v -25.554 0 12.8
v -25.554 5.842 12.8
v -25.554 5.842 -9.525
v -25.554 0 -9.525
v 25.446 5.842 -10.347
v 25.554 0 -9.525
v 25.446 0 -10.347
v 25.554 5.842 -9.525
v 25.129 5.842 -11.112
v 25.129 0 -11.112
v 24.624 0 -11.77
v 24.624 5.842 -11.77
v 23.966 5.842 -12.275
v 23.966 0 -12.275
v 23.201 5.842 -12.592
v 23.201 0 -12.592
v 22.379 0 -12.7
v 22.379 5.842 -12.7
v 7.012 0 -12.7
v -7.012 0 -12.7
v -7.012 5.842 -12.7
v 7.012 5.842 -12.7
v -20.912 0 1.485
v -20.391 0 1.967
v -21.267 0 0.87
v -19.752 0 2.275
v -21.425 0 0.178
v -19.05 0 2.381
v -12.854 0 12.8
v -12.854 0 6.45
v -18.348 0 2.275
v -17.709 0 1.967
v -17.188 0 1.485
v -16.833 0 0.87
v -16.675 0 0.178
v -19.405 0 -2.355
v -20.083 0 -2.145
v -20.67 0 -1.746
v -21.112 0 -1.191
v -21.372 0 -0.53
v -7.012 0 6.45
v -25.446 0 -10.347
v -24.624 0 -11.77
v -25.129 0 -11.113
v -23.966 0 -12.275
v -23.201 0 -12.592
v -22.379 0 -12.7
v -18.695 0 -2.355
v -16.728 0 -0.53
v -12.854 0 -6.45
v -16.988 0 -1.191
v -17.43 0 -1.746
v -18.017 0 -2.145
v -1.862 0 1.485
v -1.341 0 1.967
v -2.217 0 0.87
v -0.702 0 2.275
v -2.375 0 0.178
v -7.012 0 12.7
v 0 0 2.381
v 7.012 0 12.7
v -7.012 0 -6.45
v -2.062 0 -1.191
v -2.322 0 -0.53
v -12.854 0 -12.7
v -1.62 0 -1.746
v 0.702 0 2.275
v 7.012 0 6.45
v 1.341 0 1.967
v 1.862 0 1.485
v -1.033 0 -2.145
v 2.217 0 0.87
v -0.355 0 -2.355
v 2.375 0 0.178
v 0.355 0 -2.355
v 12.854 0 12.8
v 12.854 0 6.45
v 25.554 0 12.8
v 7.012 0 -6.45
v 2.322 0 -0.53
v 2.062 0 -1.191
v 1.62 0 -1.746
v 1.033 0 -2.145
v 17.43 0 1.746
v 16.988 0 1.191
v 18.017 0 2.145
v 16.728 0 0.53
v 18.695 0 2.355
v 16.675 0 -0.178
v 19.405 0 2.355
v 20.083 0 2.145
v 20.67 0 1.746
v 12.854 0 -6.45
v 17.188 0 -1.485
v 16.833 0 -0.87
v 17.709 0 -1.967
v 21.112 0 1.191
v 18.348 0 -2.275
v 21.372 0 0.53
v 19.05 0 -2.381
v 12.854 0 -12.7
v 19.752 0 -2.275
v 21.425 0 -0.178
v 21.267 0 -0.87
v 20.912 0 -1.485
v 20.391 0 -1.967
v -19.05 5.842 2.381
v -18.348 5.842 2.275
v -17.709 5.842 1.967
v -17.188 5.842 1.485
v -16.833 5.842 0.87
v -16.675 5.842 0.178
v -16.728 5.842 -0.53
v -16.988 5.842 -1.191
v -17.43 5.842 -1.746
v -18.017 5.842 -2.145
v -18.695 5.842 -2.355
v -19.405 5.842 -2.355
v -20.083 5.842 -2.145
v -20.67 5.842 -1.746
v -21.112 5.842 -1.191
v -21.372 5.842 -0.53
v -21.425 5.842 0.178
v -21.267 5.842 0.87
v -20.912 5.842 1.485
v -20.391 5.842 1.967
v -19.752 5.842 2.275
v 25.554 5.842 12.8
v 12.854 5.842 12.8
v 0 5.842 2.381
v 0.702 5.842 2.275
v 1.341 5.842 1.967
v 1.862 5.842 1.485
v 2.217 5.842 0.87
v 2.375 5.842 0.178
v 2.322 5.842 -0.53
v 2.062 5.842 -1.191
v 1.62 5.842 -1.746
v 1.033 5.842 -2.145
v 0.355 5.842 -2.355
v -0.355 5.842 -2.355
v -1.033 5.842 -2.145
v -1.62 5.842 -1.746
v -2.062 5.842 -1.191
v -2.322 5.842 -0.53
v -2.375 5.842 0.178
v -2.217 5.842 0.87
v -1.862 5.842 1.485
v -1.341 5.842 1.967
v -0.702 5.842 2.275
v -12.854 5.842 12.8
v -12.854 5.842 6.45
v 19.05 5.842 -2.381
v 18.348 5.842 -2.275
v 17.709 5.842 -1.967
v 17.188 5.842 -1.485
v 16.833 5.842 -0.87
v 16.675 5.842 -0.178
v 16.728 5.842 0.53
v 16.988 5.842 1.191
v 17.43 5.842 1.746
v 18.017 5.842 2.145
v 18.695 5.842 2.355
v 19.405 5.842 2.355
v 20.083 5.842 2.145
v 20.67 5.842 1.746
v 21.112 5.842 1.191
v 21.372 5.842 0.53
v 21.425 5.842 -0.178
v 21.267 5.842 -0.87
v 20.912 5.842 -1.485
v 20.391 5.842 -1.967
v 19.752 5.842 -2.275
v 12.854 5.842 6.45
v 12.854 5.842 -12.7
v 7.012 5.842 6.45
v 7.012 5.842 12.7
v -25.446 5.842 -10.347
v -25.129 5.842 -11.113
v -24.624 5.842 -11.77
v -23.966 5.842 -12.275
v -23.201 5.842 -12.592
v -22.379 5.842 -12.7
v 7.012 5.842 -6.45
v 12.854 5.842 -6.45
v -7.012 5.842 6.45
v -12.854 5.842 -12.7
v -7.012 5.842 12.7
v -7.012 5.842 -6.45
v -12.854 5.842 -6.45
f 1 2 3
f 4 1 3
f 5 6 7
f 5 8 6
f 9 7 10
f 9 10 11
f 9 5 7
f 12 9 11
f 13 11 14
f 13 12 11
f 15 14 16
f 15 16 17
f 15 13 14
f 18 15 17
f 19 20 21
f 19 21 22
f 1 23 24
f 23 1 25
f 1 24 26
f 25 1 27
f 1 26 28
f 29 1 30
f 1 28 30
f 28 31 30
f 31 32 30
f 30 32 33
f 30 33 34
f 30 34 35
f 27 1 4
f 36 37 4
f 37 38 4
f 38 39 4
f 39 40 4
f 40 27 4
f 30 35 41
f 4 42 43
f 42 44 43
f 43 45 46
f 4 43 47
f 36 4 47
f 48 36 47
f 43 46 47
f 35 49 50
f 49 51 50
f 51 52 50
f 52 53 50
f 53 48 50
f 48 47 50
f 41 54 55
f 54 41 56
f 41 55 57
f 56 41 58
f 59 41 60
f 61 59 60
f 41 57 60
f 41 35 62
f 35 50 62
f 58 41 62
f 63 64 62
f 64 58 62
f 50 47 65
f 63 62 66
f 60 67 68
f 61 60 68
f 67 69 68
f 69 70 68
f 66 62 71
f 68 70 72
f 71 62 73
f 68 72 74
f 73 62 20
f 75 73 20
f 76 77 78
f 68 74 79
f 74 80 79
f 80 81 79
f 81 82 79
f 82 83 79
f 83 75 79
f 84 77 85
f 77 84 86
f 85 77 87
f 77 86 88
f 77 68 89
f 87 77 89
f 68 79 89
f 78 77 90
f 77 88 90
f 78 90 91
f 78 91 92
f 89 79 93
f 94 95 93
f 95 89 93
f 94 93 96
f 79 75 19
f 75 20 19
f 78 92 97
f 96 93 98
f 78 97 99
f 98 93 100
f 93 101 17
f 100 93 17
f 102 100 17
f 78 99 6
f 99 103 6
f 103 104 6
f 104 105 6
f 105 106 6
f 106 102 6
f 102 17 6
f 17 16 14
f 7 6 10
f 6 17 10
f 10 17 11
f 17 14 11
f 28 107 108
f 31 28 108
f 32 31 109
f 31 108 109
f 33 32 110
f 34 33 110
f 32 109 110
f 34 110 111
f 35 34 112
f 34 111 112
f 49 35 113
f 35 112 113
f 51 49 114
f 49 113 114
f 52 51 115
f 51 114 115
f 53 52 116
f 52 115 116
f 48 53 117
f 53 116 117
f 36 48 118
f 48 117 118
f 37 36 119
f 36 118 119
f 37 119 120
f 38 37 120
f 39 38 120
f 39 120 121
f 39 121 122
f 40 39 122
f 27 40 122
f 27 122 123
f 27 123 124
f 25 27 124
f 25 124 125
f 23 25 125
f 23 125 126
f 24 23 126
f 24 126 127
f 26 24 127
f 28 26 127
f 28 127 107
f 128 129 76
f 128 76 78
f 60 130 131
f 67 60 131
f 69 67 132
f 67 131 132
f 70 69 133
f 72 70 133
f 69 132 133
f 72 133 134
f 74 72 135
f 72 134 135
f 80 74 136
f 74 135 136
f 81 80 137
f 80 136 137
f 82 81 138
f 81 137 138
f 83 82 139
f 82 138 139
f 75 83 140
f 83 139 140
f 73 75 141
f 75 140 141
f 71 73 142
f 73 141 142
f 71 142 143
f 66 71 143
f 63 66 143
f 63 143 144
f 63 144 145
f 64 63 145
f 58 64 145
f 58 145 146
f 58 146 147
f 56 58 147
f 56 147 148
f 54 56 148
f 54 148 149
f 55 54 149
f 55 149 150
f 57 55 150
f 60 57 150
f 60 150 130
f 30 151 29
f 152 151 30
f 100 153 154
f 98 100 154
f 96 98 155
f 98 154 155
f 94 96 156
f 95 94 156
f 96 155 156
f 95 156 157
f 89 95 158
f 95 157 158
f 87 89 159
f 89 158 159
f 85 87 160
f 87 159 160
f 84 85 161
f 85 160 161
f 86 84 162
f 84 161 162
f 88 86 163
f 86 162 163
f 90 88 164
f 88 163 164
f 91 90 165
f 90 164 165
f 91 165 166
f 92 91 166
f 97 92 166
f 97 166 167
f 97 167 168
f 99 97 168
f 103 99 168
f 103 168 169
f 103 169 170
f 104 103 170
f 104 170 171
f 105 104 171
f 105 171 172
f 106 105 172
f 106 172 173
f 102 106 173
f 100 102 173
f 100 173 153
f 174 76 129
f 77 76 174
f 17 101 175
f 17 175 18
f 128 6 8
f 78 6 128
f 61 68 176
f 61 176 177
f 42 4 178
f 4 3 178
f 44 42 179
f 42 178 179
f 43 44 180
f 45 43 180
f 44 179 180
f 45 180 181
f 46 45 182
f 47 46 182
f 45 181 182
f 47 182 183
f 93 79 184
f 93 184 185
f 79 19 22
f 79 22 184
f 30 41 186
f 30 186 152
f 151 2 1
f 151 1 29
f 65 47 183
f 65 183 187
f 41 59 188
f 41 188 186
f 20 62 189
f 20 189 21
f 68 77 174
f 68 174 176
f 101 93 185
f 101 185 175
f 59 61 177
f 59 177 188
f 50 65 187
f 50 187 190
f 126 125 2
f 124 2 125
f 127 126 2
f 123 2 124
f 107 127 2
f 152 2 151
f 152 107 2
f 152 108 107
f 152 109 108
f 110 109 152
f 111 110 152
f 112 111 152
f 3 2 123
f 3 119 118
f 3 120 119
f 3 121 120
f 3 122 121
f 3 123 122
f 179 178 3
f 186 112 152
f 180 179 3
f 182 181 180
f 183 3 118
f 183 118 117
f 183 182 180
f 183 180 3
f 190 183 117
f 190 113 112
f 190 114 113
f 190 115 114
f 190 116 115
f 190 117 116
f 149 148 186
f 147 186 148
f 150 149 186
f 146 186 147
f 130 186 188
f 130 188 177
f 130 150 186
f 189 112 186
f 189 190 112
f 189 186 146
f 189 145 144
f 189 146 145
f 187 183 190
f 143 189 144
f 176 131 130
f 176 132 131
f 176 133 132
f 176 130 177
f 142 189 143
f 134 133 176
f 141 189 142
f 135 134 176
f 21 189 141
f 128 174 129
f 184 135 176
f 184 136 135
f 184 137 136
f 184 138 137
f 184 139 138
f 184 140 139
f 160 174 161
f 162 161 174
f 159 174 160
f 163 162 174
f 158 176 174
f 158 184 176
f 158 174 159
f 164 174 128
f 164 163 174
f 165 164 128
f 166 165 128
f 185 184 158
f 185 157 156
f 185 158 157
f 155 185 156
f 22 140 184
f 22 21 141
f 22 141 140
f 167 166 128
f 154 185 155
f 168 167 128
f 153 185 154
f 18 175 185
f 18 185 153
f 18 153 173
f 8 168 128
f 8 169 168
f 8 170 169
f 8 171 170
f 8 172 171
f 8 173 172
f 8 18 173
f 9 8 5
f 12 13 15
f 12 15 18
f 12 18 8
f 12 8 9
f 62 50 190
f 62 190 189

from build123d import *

# Parameters (mm, degrees)
BOSS_EXTRUDE1_DEPTH = 5.842
SKETCH3_R           = 2.38125
CUT_EXTRUDE2_DEPTH  = 30.127751029
FILLET1_R           = 3.175
SKETCH4_W           = 12.7
SKETCH4_H           = 0.1
BOSS_EXTRUDE2_DEPTH = 5.842


with BuildPart() as part:
    # Sketch1 → Boss-Extrude1 (new body)
    with BuildSketch(Plane(origin=(0, 0, 0), x_dir=(1, 0, 0), z_dir=(0, 1, 0))):
        Polygon((7.012, -12.7), (-7.012, -12.7), (-7.012, -6.45), (-12.854, -6.45), (-12.854, -12.7), (-25.554, -12.7), (-25.554, 12.7), (-12.854, 12.7), (-12.854, 6.45), (-7.012, 6.45), (-7.012, 12.7), (7.012, 12.7), (7.012, 6.45), (12.854, 6.45), (12.854, 12.7), (25.554, 12.7), (25.554, -12.7), (12.854, -12.7), (12.854, -6.45), (7.012, -6.45), align=None)
    extrude(amount=BOSS_EXTRUDE1_DEPTH)

    # Sketch3 → Cut-Extrude2 (cut, through all)
    with BuildSketch(Plane(origin=(0, 5.842, 0), x_dir=(1, 0, 0), z_dir=(0, 1, 0))):
        with Locations(Location((0, 0, 0), (0, 0, 270))):
            Circle(SKETCH3_R)
        with Locations(Location((-19.05, 0, 0), (0, 0, 270))):
            Circle(SKETCH3_R)
        with Locations(Location((19.05, 0, 0), (0, 0, 90))):
            Circle(SKETCH3_R)
    extrude(amount=-CUT_EXTRUDE2_DEPTH, mode=Mode.SUBTRACT)

    # Fillet1
    fillet1_edges = [part.edges().sort_by_distance(p)[0] for p in [
        (25.554, 2.921, -12.7),
        (-25.554, 2.921, -12.7),
    ]]
    fillet(fillet1_edges, radius=FILLET1_R)

    # Sketch4 → Boss-Extrude2 (add)
    with BuildSketch(Plane(origin=(0, 5.842, 0), x_dir=(1, 0, 0), z_dir=(0, 1, 0))):
        with Locations((-19.204, -12.75)):
            Rectangle(SKETCH4_W, SKETCH4_H)
        with Locations((19.204, -12.75)):
            Rectangle(SKETCH4_W, SKETCH4_H)
    extrude(amount=-BOSS_EXTRUDE2_DEPTH)


solid = part.part
